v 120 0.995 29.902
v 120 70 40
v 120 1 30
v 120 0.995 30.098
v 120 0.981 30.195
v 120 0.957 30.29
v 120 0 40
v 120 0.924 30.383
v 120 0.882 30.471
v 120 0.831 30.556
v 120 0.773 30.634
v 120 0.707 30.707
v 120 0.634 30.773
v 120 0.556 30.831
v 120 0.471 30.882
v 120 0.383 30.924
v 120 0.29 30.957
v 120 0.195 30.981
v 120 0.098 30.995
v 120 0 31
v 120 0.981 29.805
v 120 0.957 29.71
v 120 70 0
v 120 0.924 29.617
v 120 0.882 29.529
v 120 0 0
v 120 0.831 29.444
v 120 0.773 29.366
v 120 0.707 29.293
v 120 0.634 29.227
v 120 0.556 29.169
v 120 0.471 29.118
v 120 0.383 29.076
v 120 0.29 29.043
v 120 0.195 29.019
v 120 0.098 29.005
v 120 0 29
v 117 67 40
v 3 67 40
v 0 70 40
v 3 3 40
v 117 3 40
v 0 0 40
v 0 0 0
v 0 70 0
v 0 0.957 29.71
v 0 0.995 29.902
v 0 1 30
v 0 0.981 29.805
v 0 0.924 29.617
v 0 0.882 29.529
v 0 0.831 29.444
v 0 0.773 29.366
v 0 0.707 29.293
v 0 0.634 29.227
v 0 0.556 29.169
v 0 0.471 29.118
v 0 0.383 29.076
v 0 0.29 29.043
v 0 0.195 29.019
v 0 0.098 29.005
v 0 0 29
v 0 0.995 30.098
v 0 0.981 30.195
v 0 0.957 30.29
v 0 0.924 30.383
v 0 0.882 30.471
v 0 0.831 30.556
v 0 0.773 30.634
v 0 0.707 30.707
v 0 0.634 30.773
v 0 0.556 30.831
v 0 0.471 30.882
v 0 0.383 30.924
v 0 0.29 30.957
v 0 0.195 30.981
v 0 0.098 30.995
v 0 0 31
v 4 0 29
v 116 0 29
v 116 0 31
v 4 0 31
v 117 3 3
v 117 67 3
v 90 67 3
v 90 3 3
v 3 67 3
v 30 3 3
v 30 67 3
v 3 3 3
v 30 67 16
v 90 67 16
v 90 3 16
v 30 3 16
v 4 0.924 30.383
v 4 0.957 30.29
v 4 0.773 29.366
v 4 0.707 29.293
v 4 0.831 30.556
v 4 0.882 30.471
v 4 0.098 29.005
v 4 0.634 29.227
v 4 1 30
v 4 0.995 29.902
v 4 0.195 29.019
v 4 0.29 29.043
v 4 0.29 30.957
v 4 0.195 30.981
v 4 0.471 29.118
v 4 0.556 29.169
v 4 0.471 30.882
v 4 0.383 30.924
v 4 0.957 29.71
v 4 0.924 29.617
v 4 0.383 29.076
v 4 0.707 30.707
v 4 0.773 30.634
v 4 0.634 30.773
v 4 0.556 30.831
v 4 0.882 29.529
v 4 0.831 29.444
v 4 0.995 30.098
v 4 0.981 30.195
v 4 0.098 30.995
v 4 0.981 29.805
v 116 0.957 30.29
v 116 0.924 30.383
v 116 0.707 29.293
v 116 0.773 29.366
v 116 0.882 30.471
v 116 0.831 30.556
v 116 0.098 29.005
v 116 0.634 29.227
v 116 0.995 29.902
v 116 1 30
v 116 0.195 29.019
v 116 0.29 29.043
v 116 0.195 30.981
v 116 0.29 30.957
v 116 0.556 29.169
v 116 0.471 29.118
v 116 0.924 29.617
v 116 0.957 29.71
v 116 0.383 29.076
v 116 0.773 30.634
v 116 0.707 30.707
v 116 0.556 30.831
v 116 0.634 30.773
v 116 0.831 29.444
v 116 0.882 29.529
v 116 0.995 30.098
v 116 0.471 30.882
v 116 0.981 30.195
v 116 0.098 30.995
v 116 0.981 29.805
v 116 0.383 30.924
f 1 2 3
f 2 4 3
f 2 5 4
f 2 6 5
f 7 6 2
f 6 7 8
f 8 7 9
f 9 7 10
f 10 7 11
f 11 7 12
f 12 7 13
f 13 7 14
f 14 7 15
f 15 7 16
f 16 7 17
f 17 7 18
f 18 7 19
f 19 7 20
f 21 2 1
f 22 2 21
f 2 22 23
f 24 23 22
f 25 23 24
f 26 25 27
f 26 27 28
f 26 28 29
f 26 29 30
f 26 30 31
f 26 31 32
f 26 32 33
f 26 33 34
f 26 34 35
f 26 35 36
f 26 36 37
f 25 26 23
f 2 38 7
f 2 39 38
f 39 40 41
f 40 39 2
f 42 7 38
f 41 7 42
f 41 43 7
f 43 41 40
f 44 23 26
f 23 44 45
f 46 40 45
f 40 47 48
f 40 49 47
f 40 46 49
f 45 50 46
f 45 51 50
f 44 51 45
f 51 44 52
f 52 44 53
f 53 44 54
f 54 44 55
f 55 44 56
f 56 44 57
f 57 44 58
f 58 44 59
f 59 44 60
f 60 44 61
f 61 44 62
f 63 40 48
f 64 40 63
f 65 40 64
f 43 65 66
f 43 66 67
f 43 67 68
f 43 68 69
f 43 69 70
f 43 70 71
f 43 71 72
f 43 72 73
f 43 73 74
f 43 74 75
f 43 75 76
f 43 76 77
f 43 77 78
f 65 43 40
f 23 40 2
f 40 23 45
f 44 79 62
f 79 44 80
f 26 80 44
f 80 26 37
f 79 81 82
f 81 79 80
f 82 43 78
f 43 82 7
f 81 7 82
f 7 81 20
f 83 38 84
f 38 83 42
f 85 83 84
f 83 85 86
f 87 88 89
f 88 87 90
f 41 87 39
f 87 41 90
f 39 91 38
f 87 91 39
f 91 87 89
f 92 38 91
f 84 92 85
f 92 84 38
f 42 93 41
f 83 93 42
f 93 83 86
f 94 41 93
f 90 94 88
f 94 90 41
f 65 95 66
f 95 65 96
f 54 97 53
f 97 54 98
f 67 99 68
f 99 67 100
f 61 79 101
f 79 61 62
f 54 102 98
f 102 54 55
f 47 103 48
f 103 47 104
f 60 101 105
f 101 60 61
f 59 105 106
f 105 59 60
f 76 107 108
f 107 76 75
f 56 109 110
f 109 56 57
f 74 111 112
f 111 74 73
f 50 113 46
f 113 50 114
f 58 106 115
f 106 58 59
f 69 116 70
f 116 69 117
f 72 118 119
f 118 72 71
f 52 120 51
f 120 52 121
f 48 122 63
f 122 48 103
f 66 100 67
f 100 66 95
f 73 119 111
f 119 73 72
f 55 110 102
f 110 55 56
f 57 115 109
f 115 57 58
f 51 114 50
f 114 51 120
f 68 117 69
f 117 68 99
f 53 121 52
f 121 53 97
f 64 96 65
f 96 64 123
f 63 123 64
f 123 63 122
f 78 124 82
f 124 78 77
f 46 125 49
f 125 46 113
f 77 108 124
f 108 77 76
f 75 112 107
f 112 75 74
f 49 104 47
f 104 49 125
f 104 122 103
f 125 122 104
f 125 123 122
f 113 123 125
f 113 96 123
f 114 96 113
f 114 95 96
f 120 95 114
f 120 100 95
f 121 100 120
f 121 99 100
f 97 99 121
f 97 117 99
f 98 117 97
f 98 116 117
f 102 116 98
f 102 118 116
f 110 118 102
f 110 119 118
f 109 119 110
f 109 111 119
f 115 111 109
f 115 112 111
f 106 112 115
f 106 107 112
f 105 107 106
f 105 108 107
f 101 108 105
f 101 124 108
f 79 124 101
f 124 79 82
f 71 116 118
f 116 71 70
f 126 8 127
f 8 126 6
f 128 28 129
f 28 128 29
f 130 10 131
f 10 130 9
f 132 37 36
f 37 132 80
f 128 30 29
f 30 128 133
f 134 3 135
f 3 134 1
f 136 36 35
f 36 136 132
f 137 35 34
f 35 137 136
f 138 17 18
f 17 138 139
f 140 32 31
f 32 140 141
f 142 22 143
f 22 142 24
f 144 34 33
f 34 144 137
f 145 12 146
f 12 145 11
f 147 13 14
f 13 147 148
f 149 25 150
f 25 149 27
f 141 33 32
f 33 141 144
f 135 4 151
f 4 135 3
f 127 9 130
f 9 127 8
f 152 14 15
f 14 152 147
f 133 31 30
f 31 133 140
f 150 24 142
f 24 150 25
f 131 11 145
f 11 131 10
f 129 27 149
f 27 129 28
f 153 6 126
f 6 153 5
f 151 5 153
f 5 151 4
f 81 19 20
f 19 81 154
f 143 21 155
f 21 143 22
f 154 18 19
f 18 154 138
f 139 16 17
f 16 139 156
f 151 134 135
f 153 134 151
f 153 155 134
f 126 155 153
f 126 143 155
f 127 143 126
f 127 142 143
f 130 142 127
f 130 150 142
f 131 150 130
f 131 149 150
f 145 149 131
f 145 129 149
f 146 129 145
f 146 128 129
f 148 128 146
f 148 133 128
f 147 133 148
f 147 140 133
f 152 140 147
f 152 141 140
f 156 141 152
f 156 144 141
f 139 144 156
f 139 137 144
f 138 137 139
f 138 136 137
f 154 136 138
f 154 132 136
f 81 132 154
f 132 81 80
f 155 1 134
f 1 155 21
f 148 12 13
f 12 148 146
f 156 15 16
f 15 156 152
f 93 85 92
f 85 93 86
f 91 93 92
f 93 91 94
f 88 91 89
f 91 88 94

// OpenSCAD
// Buffer tank for mini horizontal gel-electrophoresis box
// Designed for FDM 3D printing

// --- Dimensions ---
length_outer = 120.0; // X dimension
width_outer  = 70.0;  // Y dimension
height_outer = 40.0;  // Z dimension
wall_thick   = 3.0;   // Thickness of walls and floor
floor_thick  = 3.0;   // Thickness of the floor
platform_len = 60.0;   // Length of the central platform (X direction)
platform_h   = 13.0;   // Height of platform top from the inner floor (Z)
hole_diam    = 2.0;    // Diameter of electrode wire holes
hole_y       = 0.0;    // Y position of the holes (centered on Y axis)
hole_z       = 30.0;   // Z position of the holes (from the base of the tank)

$fn = 64;

// --- Calculations ---
inner_x = length_outer - 2 * wall_thick;
inner_y = width_outer - 2 * wall_thick;
inner_z_max = height_outer - floor_thick;

// The platform spans the full inner width (Y)
// It is centered in X.
platform_x_start = (length_outer / 2) - (platform_len / 2);
platform_x_end   = (length_outer / 2) + (platform_len / 2);

// --- Modeling ---

difference() {
    // Main Tank Body
    cube([length_outer, width_outer, height_outer]);

    // Hollow out the interior
    // We subtract the floor thickness from the bottom
    translate([wall_thick, wall_thick, floor_thick])
        cube([inner_x, inner_y, height_outer]);

    // Electrode wire holes
    // Drilled through the X-end walls (at X=0 and X=length_outer)
    // The holes are horizontal along X.
    // We use a large cylinder to ensure clean cut through the walls.
    
    // Hole at X = 0 end
    translate([-1, hole_y, hole_z])
        rotate([0, 90, 0])
            cylinder(h = wall_thick + 2, d = hole_diam);
            
    // Hole at X = length_outer end
    translate([length_outer - wall_thick - 1, hole_y, hole_z])
        rotate([0, 90, 0])
            cylinder(h = wall_thick + 2, d = hole_diam);
}

// The Platform
// It is a solid raised platform inside the tank.
// It sits on the inner floor (z = floor_thick) and goes up to z = floor_thick + platform_h
translate([platform_x_start, wall_thick, floor_thick])
    cube([platform_len, inner_y, platform_h]);
